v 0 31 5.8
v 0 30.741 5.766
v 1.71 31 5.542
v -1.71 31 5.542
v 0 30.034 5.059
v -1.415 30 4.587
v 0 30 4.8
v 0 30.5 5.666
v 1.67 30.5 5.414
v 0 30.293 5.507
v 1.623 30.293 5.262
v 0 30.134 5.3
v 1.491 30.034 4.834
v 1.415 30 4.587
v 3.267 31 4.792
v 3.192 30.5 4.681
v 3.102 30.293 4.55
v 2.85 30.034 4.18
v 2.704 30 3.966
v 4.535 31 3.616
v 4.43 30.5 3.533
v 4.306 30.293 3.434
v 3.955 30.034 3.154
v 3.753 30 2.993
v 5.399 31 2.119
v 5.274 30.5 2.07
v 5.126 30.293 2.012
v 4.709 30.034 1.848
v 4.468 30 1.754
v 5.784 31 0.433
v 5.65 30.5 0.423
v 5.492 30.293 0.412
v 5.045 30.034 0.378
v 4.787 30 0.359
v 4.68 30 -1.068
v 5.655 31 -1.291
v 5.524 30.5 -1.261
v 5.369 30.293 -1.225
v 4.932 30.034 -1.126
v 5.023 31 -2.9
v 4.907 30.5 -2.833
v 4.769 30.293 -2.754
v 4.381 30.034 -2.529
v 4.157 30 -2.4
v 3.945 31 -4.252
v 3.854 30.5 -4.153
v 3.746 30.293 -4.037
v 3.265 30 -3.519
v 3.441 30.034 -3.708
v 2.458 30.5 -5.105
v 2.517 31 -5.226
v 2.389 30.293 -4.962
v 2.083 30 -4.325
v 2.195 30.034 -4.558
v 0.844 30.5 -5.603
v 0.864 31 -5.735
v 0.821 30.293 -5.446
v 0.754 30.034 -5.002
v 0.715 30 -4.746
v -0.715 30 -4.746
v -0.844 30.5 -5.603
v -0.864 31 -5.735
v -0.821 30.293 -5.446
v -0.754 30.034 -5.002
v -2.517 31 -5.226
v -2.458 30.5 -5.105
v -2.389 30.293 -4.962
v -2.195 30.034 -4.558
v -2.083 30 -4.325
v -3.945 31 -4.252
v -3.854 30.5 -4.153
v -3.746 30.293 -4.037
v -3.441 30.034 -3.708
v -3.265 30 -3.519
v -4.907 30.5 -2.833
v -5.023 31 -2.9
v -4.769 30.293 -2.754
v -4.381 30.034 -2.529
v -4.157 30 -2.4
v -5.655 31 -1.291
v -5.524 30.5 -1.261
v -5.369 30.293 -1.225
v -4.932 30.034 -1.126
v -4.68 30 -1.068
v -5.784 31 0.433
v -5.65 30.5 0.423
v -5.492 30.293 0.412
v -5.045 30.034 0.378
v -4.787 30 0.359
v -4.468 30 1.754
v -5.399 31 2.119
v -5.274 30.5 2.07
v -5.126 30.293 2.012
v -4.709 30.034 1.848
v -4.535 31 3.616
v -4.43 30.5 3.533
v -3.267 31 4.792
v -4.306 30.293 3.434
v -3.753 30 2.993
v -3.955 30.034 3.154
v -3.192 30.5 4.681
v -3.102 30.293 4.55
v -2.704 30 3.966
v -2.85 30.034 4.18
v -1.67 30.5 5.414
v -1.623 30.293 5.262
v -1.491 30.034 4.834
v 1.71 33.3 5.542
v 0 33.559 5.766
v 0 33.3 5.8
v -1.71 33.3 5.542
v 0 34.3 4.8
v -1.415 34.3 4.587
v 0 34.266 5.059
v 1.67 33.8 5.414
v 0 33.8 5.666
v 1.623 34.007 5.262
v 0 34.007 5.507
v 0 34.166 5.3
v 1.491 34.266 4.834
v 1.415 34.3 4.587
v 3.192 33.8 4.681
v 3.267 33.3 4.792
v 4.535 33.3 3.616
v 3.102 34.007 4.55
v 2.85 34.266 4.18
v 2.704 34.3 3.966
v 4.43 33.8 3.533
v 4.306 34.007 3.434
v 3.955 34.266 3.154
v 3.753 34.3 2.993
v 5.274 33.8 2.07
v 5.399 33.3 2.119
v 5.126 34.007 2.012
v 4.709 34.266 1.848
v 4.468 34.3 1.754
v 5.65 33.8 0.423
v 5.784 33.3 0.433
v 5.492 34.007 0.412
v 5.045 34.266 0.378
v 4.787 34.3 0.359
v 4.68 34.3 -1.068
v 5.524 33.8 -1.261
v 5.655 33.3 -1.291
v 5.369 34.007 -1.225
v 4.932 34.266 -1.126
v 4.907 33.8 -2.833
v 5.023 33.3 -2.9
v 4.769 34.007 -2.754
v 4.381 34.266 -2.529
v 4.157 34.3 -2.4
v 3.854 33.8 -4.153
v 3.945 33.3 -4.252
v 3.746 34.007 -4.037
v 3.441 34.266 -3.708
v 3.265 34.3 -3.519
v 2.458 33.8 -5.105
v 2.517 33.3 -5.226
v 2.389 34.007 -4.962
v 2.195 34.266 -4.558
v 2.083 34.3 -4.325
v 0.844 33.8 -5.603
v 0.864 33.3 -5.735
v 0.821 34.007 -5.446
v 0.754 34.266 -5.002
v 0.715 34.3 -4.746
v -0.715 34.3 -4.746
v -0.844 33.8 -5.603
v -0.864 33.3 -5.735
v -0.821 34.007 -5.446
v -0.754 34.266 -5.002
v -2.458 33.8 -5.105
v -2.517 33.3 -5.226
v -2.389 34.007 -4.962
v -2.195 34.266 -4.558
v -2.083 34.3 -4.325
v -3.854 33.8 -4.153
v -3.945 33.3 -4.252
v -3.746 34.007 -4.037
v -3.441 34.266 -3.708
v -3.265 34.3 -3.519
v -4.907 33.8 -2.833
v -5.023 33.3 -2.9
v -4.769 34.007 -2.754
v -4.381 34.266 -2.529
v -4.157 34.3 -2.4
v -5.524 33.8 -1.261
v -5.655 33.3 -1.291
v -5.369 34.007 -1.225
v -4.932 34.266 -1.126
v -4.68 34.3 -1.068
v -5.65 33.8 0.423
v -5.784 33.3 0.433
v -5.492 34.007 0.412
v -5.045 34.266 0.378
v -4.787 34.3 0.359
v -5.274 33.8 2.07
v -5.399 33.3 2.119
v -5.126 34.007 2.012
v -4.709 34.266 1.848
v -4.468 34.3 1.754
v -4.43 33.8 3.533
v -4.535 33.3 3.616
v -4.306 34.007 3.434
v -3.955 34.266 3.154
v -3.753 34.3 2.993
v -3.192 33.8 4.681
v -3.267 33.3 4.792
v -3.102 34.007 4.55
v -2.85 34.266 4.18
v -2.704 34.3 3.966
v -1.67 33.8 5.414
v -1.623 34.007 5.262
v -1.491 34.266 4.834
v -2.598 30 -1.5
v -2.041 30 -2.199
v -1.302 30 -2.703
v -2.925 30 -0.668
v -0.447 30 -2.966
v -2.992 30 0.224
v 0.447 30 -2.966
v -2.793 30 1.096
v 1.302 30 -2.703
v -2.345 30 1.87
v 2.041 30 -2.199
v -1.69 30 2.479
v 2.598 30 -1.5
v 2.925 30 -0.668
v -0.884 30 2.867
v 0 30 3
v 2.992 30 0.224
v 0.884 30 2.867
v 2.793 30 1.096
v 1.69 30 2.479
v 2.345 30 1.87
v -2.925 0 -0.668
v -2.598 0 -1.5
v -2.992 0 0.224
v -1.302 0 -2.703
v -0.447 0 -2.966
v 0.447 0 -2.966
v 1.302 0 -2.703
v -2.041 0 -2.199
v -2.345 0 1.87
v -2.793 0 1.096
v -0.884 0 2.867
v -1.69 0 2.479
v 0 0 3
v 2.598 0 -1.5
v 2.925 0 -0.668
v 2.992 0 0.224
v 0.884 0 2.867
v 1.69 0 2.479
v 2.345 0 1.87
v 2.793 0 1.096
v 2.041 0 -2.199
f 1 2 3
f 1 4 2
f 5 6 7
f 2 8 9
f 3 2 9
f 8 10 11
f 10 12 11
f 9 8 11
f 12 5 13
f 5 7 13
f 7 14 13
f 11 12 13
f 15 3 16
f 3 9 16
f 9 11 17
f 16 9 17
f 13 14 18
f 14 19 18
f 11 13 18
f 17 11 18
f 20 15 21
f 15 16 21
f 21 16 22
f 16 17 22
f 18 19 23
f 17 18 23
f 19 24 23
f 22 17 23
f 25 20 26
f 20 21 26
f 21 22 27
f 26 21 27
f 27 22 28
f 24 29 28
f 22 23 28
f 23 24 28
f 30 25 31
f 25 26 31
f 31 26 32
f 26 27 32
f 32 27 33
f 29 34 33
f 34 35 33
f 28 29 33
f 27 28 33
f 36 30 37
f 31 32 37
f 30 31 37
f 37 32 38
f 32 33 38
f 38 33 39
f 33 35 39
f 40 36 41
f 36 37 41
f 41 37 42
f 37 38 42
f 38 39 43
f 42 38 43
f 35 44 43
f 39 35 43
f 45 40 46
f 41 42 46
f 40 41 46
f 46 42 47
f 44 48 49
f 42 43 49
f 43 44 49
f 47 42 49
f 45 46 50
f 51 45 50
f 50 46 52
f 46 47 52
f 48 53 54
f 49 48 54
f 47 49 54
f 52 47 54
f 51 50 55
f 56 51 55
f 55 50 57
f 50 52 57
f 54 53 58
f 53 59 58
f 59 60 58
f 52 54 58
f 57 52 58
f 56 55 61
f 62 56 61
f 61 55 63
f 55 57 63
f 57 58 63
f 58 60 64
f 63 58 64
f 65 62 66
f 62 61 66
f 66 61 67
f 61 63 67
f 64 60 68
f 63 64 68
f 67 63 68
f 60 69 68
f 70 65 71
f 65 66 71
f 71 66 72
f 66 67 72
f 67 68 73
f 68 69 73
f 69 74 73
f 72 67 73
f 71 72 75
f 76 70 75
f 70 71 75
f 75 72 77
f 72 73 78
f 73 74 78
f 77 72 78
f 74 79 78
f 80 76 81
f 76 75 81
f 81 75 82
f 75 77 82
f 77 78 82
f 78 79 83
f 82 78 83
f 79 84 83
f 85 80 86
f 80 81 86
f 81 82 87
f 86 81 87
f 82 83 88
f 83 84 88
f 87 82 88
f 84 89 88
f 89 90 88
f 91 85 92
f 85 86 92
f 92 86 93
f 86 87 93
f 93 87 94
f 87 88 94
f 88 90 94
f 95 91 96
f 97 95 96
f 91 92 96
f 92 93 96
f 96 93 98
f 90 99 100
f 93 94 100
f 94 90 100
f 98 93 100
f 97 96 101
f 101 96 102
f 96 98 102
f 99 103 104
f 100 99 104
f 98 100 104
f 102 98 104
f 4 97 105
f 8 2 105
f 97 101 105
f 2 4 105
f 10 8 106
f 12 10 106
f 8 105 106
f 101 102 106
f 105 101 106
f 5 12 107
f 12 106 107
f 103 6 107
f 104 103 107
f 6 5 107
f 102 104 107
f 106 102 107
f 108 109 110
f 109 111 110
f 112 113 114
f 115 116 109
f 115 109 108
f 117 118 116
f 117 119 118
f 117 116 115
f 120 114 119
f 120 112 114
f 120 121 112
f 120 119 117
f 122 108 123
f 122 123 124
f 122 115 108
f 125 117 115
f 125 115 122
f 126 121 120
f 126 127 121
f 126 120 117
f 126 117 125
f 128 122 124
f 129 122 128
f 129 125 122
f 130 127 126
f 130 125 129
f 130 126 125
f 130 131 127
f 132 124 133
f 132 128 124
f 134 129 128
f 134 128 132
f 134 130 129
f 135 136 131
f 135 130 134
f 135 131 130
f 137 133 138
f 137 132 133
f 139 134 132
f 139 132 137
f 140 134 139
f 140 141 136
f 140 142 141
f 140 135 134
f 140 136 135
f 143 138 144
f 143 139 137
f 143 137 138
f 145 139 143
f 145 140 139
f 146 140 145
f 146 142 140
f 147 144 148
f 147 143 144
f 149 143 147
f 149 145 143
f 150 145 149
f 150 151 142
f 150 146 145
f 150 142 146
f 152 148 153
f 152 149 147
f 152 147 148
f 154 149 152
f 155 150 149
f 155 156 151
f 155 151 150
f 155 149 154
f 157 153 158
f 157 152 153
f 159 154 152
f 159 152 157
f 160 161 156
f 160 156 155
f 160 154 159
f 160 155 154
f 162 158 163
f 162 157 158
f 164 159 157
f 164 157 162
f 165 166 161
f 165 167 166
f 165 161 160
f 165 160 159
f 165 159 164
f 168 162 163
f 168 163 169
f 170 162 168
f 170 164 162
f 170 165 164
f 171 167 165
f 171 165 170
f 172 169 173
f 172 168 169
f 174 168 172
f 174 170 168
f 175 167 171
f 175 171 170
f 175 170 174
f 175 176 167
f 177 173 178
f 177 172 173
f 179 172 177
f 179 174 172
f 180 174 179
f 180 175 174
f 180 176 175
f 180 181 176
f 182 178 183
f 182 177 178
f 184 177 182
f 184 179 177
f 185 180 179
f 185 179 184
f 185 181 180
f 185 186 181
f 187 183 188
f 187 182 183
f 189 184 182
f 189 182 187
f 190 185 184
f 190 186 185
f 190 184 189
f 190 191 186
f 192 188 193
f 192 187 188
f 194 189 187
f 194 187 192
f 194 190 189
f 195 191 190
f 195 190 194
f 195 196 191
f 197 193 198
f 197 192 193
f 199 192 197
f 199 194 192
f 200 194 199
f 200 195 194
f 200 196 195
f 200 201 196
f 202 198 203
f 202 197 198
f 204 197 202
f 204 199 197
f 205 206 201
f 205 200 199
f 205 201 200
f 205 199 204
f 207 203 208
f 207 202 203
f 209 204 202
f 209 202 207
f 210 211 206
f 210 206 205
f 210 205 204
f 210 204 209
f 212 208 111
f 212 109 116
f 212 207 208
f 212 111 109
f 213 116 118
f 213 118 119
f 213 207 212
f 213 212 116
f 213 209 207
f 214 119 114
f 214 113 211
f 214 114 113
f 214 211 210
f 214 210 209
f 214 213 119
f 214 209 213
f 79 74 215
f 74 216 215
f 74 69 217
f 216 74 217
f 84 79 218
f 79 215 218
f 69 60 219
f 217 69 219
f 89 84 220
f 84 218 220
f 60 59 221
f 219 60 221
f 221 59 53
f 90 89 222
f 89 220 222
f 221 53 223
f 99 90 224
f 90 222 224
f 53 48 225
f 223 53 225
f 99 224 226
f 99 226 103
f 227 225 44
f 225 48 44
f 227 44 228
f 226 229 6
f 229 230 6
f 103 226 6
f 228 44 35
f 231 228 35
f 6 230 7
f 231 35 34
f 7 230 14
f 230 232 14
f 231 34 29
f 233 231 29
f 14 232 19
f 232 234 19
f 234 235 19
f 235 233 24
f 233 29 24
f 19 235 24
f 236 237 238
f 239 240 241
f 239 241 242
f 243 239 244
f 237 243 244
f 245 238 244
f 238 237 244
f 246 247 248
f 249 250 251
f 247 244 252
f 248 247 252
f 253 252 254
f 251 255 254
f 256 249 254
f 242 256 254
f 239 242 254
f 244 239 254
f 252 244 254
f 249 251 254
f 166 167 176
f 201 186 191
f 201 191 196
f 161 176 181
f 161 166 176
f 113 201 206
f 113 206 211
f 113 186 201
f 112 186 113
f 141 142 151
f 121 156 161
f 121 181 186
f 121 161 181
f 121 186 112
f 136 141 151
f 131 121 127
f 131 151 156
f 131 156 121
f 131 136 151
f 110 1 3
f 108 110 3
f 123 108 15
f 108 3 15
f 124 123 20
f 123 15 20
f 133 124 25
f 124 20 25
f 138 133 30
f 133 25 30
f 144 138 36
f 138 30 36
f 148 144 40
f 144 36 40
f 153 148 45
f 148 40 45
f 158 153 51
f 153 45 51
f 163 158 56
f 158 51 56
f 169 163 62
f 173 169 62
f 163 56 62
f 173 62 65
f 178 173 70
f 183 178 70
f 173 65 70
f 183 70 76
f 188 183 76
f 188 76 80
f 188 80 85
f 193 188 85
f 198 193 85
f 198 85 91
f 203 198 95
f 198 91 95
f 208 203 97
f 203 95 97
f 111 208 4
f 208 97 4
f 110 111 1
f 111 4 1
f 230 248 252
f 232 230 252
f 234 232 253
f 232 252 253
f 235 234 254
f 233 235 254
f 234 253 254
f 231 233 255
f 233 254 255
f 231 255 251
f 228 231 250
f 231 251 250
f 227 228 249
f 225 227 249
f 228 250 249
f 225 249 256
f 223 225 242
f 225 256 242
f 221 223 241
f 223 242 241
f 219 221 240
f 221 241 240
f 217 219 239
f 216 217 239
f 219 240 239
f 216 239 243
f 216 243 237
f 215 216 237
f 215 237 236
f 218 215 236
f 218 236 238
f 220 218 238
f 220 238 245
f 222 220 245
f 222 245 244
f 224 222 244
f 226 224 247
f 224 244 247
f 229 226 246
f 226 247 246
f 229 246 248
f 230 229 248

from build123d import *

# Parameters (mm, degrees)
SKETCH1_R           = 3
BOSS_EXTRUDE1_DEPTH = 30
SKETCH2_R           = 5.8
BOSS_EXTRUDE2_DEPTH = 4.3
FILLET1_R           = 1


with BuildPart() as part:
    # Sketch1 → Boss-Extrude1 (new body)
    with BuildSketch(Plane(origin=(0, 0, 0), x_dir=(1, 0, 0), z_dir=(0, 1, 0))):
        with Locations(Location((0, 0, 0), (0, 0, 270))):  # turned: the seam where the file's is
            Circle(SKETCH1_R)
    extrude(amount=BOSS_EXTRUDE1_DEPTH)

    # Sketch2 → Boss-Extrude2 (add)
    with BuildSketch(Plane(origin=(0, 30, 0), x_dir=(1, 0, 0), z_dir=(0, 1, 0))):
        with Locations(Location((0, 0, 0), (0, 0, 270))):  # turned: the seam where the file's is
            Circle(SKETCH2_R)
    extrude(amount=BOSS_EXTRUDE2_DEPTH)

    # Fillet1
    fillet1_edges = [part.edges().sort_by_distance(p)[0] for p in [
        (0, 30, -5.8),
        (0, 34.3, -5.8),
    ]]
    fillet(fillet1_edges, radius=FILLET1_R)


solid = part.part
